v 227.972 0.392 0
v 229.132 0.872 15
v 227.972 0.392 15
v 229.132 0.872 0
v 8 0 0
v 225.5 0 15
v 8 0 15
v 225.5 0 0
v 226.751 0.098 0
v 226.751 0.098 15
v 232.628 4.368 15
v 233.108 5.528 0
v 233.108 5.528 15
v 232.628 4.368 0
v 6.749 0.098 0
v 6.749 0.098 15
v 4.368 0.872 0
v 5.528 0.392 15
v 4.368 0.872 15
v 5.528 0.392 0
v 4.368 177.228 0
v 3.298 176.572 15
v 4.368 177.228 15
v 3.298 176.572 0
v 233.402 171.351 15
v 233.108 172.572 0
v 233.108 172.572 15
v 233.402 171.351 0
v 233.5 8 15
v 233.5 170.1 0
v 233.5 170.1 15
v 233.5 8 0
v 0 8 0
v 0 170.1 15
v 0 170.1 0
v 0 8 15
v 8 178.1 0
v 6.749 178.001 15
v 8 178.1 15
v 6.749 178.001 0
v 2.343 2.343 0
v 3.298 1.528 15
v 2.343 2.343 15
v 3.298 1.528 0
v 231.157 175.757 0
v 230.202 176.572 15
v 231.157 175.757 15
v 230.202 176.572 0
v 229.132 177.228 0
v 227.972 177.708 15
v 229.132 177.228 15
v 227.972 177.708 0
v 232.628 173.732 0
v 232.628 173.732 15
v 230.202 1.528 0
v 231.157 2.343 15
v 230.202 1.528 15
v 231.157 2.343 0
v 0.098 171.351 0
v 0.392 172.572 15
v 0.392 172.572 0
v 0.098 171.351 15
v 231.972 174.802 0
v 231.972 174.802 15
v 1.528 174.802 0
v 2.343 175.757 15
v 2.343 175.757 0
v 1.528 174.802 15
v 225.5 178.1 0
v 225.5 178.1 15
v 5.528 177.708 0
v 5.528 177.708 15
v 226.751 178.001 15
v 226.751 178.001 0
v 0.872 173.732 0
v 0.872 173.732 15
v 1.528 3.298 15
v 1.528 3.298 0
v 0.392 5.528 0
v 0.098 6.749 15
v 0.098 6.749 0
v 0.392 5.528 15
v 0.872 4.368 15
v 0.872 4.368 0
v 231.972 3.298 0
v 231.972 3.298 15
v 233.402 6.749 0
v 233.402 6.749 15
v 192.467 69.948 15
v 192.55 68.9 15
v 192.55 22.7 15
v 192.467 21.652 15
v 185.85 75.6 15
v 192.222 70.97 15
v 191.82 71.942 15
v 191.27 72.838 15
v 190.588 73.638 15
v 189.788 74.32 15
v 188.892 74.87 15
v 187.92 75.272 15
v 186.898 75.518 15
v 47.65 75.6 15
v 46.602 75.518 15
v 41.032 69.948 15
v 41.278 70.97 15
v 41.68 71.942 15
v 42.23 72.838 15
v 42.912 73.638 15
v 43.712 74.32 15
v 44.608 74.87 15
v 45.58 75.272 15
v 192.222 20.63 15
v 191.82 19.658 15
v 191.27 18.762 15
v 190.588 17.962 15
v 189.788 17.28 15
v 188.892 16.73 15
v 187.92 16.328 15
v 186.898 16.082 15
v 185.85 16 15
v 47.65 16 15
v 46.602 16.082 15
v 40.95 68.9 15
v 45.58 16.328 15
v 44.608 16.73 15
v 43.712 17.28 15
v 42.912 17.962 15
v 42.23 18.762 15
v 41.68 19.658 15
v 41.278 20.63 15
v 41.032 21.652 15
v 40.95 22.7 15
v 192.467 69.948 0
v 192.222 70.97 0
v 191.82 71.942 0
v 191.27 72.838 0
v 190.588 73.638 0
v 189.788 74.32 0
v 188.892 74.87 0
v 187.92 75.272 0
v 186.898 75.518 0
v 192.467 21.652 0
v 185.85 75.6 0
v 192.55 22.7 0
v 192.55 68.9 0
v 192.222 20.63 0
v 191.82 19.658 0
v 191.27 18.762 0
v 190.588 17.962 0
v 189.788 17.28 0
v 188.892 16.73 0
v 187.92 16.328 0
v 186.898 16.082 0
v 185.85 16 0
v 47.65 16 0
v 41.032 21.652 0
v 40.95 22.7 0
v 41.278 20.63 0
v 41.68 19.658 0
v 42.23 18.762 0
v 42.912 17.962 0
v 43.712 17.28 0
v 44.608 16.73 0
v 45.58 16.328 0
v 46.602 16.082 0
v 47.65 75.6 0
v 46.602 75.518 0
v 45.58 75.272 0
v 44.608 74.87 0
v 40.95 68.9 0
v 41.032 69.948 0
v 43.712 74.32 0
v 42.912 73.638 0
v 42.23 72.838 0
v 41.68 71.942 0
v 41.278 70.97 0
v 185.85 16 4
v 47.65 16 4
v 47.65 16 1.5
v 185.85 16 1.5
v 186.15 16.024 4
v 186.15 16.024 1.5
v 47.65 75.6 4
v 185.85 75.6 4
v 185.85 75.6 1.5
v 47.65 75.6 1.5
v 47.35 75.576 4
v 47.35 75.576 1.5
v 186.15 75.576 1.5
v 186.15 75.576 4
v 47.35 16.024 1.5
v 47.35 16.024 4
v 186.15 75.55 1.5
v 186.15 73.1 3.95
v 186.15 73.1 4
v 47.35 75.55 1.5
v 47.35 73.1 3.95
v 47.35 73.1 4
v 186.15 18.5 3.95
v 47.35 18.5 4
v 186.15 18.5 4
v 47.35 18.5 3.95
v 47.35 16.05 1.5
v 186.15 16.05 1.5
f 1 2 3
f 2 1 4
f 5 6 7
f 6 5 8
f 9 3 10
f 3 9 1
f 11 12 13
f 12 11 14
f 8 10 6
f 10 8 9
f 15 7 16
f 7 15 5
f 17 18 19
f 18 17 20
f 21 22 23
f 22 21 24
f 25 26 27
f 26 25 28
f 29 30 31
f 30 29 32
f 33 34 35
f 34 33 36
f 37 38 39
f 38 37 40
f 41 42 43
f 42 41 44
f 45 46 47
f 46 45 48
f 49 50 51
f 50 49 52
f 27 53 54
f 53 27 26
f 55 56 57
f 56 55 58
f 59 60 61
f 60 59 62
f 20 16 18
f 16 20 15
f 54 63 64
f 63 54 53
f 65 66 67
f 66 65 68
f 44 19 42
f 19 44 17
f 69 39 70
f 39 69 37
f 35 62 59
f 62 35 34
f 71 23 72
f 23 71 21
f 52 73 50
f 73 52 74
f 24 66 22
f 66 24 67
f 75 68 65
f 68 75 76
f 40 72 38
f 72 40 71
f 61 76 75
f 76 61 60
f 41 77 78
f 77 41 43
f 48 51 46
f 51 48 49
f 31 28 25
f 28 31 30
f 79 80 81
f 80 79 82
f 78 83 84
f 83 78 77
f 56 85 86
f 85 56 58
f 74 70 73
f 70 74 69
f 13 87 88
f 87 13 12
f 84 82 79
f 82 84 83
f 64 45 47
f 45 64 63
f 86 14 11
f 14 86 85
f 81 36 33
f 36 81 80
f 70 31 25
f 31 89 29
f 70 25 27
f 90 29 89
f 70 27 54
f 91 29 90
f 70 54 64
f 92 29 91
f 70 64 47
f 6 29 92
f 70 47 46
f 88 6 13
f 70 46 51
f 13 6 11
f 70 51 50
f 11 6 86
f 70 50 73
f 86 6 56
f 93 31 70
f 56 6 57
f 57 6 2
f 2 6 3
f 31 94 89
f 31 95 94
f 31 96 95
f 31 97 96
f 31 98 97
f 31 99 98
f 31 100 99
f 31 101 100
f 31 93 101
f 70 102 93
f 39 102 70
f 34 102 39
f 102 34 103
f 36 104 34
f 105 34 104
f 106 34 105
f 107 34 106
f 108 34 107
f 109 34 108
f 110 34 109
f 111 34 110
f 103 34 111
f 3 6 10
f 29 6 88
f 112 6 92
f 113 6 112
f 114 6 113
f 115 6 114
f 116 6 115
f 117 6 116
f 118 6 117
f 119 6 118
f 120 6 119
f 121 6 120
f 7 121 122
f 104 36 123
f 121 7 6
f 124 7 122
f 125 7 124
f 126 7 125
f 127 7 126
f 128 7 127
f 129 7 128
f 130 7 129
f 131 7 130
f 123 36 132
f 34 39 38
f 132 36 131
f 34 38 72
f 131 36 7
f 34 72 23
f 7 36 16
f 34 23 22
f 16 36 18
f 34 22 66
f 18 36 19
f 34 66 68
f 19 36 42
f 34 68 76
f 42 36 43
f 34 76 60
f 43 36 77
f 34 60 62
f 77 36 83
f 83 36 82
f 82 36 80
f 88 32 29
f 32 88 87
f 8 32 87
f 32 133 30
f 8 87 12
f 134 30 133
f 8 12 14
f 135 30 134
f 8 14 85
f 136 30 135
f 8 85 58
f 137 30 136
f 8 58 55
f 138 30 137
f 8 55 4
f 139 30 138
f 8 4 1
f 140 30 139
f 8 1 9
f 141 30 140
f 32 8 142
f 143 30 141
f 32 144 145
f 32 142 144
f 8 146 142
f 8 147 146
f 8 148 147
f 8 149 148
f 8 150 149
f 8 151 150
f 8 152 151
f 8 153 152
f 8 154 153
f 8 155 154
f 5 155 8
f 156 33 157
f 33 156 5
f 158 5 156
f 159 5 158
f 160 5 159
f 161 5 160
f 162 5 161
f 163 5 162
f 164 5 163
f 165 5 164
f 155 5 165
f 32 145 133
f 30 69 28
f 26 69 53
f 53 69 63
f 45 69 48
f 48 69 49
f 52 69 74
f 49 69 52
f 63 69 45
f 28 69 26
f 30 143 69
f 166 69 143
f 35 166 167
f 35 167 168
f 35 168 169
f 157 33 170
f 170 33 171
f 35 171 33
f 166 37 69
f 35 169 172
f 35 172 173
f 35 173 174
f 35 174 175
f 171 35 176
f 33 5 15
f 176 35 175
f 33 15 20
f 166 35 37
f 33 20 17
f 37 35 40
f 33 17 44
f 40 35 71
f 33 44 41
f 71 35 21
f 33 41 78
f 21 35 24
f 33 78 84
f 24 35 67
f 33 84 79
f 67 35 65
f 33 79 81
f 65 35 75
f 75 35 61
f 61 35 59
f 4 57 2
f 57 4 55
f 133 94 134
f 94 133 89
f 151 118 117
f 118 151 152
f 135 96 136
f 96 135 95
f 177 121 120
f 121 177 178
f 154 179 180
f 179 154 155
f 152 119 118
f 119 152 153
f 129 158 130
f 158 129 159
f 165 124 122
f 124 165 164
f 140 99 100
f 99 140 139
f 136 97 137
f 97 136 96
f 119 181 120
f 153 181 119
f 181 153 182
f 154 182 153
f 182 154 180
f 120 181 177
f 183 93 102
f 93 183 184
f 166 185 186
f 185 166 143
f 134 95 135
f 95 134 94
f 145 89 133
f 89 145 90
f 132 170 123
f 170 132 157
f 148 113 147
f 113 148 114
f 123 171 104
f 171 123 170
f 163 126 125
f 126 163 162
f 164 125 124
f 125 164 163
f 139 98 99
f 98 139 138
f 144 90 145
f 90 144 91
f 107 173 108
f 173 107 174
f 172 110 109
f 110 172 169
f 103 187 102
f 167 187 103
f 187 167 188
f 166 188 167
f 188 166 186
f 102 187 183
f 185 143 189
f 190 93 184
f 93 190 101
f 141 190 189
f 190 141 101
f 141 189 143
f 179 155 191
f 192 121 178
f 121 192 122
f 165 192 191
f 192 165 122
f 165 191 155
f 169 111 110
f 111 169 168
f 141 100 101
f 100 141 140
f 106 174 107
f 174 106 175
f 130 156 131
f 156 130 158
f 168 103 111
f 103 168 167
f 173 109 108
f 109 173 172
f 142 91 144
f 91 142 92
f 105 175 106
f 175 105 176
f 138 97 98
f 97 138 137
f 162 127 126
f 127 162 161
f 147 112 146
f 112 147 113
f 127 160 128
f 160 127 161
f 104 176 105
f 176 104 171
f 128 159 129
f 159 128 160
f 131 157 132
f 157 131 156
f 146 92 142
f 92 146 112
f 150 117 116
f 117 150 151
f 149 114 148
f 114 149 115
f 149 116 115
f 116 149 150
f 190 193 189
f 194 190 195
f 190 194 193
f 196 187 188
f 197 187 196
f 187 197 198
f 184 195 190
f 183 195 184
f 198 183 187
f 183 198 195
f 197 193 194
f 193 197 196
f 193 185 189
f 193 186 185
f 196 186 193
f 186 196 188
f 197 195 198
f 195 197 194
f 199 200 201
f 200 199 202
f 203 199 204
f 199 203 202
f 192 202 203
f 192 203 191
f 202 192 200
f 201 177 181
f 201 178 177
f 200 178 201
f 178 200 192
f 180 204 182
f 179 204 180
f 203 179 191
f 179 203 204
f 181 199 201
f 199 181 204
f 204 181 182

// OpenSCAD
// Ktemata R6 - keyboard lid plate
//
// This is the HOST LID plate, not the 7-inch display mount: R6's Waveshare panel belongs to the
// separate cassette deck. The K06 and its keys finish flush with the broad front face. The rear
// face tapes into the Peli lid; apart from the keyboard opening the plate is solid, with no host
// hole or harness channel.
//
// Prototype fit part: keyboard positions are shared with paint_probe_r6.scad through common.scad.
// Measure the actual lid and keyboard before painting or final assembly.
//
// Coordinates: x left->right, drawing y = 0 at the hinge, z = 0 at the rear/tape face and z = 15
// at the visible front. PRINT VISIBLE-FRONT DOWN (export.scad flips about x). The open keyboard
// recess and its 45-degree ledges print without support in that orientation.
include <common.scad>

module r6_lid_box(x0, y0, x1, y1, z, h)
    translate([x0, R6_LID_L-y1, z]) cube([x1-x0, y1-y0, h]);

module r6_lid_outline() rrect(R6_LID_W, R6_LID_L, R6_LID_R);
module r6_lid_slab() linear_extrude(R6_LID_T) r6_lid_outline();

// K06 through-opening, with the measured rounded outline and fitting clearance.
module r6_lid_kb_prism(z, h) {
    translate([R5_KB_X0, R6_LID_L-R5_KB_Y0-R5_KB_POCKET[1], z])
        linear_extrude(h)
            rrect(R5_KB_POCKET[0], R5_KB_POCKET[1], R5_KB_CORNER+R5_KB_CLR);
}
module r6_lid_kb_cut() r6_lid_kb_prism(-1, R6_LID_T+2);

// Two keyboard seat ledges, one on each long wall. The body rests at z = 4 and its keys finish
// at z = 15. The ledge's 45-degree underside prints cleanly when the front is on the bed; the
// 0.8 mm overlap into the wall prevents a tangent/non-manifold union.
module r6_lid_kb_ledge(y_in, s) {
    e = 0.05;
    ov = 0.8;
    zb = R6_LID_KB_SEAT_Z-R5_KB_SEAT;
    ya = s > 0 ? y_in-ov : y_in-R5_KB_SEAT;
    yb = s > 0 ? y_in+R5_KB_SEAT : y_in+ov;
    x0 = R5_KB_SEAT_X0;
    x1 = R5_KB_SEAT_X1;
    hull() {
        if (s > 0) r6_lid_box(x0, y_in-ov, x1, y_in+e, zb, R5_KB_SEAT);
        else       r6_lid_box(x0, y_in-e, x1, y_in+ov, zb, R5_KB_SEAT);
        r6_lid_box(x0, ya, x1, yb, R6_LID_KB_SEAT_Z-e, e);
    }
}

module r6_lid_plate() union() {
    // Cut the K06 opening before adding its ledges, so no floor appears across the opening.
    difference() {
        r6_lid_slab();
        r6_lid_kb_cut();
    }
    r6_lid_kb_ledge(R5_KB_Y0, 1);
    r6_lid_kb_ledge(R5_KB_Y0+R5_KB_POCKET[1], -1);
}

if (is_undef(ASSEMBLY)) r6_lid_plate();
